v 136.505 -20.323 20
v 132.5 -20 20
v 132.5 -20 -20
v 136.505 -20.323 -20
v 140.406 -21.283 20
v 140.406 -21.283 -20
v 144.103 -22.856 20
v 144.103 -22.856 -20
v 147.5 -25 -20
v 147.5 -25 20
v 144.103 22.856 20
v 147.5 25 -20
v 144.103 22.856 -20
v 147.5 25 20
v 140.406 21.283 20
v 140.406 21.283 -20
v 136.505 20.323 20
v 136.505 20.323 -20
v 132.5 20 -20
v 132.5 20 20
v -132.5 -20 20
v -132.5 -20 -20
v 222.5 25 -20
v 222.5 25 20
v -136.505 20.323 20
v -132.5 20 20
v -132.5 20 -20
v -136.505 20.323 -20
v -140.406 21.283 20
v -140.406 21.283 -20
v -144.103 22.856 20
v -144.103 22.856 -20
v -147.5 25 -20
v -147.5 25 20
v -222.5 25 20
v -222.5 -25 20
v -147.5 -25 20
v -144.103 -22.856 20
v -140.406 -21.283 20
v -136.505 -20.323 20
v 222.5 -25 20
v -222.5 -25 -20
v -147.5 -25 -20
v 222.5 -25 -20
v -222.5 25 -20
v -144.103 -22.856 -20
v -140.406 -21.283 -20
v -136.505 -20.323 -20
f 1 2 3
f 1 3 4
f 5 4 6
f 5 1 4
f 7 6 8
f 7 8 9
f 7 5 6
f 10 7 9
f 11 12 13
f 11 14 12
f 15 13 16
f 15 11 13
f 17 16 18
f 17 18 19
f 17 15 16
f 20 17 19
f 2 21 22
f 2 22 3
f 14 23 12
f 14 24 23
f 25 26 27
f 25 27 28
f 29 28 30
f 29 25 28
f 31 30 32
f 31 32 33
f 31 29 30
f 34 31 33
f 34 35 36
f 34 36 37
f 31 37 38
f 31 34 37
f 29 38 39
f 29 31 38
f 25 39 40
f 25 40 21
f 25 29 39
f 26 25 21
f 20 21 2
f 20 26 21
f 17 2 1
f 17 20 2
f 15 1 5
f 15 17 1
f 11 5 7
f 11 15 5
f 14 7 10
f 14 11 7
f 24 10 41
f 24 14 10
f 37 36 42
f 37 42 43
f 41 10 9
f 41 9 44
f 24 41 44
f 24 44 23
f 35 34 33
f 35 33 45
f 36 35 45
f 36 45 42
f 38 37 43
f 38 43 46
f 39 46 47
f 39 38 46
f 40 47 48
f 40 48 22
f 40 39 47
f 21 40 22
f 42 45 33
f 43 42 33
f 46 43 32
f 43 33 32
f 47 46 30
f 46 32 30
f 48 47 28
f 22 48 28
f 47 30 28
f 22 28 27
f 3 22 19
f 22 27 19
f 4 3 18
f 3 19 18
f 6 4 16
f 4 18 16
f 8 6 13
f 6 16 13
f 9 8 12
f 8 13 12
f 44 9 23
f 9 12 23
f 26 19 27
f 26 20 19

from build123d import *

# Parameters (mm, degrees)
F1_DEPTH = 20


with BuildPart() as f1:
    # F0 (on Top) → F1 (new body, symmetric)
    with BuildSketch(Plane.XY):
        with BuildLine():
            Line((132.5, 20), (0, 20))
            Line((0, 20), (-132.5, 20))
            ThreePointArc((-132.5, 20), (-140.405694, 21.282918), (-147.5, 25))
            Line((-147.5, 25), (-222.5, 25))
            Line((-222.5, 25), (-222.5, 0))
            Line((-222.5, 0), (-222.5, -25))
            Line((-222.5, -25), (-147.5, -25))
            ThreePointArc((-147.5, -25), (-140.405694, -21.282918), (-132.5, -20))
            Line((-132.5, -20), (0, -20))
            Line((0, -20), (132.5, -20))
            ThreePointArc((132.5, -20), (140.405694, -21.282918), (147.5, -25))
            Line((147.5, -25), (222.5, -25))
            Line((222.5, -25), (222.5, 0))
            Line((222.5, 0), (222.5, 25))
            Line((222.5, 25), (147.5, 25))
            ThreePointArc((147.5, 25), (140.405694, 21.282918), (132.5, 20))
        make_face()
    extrude(amount=F1_DEPTH, both=True)


solid = f1.part
